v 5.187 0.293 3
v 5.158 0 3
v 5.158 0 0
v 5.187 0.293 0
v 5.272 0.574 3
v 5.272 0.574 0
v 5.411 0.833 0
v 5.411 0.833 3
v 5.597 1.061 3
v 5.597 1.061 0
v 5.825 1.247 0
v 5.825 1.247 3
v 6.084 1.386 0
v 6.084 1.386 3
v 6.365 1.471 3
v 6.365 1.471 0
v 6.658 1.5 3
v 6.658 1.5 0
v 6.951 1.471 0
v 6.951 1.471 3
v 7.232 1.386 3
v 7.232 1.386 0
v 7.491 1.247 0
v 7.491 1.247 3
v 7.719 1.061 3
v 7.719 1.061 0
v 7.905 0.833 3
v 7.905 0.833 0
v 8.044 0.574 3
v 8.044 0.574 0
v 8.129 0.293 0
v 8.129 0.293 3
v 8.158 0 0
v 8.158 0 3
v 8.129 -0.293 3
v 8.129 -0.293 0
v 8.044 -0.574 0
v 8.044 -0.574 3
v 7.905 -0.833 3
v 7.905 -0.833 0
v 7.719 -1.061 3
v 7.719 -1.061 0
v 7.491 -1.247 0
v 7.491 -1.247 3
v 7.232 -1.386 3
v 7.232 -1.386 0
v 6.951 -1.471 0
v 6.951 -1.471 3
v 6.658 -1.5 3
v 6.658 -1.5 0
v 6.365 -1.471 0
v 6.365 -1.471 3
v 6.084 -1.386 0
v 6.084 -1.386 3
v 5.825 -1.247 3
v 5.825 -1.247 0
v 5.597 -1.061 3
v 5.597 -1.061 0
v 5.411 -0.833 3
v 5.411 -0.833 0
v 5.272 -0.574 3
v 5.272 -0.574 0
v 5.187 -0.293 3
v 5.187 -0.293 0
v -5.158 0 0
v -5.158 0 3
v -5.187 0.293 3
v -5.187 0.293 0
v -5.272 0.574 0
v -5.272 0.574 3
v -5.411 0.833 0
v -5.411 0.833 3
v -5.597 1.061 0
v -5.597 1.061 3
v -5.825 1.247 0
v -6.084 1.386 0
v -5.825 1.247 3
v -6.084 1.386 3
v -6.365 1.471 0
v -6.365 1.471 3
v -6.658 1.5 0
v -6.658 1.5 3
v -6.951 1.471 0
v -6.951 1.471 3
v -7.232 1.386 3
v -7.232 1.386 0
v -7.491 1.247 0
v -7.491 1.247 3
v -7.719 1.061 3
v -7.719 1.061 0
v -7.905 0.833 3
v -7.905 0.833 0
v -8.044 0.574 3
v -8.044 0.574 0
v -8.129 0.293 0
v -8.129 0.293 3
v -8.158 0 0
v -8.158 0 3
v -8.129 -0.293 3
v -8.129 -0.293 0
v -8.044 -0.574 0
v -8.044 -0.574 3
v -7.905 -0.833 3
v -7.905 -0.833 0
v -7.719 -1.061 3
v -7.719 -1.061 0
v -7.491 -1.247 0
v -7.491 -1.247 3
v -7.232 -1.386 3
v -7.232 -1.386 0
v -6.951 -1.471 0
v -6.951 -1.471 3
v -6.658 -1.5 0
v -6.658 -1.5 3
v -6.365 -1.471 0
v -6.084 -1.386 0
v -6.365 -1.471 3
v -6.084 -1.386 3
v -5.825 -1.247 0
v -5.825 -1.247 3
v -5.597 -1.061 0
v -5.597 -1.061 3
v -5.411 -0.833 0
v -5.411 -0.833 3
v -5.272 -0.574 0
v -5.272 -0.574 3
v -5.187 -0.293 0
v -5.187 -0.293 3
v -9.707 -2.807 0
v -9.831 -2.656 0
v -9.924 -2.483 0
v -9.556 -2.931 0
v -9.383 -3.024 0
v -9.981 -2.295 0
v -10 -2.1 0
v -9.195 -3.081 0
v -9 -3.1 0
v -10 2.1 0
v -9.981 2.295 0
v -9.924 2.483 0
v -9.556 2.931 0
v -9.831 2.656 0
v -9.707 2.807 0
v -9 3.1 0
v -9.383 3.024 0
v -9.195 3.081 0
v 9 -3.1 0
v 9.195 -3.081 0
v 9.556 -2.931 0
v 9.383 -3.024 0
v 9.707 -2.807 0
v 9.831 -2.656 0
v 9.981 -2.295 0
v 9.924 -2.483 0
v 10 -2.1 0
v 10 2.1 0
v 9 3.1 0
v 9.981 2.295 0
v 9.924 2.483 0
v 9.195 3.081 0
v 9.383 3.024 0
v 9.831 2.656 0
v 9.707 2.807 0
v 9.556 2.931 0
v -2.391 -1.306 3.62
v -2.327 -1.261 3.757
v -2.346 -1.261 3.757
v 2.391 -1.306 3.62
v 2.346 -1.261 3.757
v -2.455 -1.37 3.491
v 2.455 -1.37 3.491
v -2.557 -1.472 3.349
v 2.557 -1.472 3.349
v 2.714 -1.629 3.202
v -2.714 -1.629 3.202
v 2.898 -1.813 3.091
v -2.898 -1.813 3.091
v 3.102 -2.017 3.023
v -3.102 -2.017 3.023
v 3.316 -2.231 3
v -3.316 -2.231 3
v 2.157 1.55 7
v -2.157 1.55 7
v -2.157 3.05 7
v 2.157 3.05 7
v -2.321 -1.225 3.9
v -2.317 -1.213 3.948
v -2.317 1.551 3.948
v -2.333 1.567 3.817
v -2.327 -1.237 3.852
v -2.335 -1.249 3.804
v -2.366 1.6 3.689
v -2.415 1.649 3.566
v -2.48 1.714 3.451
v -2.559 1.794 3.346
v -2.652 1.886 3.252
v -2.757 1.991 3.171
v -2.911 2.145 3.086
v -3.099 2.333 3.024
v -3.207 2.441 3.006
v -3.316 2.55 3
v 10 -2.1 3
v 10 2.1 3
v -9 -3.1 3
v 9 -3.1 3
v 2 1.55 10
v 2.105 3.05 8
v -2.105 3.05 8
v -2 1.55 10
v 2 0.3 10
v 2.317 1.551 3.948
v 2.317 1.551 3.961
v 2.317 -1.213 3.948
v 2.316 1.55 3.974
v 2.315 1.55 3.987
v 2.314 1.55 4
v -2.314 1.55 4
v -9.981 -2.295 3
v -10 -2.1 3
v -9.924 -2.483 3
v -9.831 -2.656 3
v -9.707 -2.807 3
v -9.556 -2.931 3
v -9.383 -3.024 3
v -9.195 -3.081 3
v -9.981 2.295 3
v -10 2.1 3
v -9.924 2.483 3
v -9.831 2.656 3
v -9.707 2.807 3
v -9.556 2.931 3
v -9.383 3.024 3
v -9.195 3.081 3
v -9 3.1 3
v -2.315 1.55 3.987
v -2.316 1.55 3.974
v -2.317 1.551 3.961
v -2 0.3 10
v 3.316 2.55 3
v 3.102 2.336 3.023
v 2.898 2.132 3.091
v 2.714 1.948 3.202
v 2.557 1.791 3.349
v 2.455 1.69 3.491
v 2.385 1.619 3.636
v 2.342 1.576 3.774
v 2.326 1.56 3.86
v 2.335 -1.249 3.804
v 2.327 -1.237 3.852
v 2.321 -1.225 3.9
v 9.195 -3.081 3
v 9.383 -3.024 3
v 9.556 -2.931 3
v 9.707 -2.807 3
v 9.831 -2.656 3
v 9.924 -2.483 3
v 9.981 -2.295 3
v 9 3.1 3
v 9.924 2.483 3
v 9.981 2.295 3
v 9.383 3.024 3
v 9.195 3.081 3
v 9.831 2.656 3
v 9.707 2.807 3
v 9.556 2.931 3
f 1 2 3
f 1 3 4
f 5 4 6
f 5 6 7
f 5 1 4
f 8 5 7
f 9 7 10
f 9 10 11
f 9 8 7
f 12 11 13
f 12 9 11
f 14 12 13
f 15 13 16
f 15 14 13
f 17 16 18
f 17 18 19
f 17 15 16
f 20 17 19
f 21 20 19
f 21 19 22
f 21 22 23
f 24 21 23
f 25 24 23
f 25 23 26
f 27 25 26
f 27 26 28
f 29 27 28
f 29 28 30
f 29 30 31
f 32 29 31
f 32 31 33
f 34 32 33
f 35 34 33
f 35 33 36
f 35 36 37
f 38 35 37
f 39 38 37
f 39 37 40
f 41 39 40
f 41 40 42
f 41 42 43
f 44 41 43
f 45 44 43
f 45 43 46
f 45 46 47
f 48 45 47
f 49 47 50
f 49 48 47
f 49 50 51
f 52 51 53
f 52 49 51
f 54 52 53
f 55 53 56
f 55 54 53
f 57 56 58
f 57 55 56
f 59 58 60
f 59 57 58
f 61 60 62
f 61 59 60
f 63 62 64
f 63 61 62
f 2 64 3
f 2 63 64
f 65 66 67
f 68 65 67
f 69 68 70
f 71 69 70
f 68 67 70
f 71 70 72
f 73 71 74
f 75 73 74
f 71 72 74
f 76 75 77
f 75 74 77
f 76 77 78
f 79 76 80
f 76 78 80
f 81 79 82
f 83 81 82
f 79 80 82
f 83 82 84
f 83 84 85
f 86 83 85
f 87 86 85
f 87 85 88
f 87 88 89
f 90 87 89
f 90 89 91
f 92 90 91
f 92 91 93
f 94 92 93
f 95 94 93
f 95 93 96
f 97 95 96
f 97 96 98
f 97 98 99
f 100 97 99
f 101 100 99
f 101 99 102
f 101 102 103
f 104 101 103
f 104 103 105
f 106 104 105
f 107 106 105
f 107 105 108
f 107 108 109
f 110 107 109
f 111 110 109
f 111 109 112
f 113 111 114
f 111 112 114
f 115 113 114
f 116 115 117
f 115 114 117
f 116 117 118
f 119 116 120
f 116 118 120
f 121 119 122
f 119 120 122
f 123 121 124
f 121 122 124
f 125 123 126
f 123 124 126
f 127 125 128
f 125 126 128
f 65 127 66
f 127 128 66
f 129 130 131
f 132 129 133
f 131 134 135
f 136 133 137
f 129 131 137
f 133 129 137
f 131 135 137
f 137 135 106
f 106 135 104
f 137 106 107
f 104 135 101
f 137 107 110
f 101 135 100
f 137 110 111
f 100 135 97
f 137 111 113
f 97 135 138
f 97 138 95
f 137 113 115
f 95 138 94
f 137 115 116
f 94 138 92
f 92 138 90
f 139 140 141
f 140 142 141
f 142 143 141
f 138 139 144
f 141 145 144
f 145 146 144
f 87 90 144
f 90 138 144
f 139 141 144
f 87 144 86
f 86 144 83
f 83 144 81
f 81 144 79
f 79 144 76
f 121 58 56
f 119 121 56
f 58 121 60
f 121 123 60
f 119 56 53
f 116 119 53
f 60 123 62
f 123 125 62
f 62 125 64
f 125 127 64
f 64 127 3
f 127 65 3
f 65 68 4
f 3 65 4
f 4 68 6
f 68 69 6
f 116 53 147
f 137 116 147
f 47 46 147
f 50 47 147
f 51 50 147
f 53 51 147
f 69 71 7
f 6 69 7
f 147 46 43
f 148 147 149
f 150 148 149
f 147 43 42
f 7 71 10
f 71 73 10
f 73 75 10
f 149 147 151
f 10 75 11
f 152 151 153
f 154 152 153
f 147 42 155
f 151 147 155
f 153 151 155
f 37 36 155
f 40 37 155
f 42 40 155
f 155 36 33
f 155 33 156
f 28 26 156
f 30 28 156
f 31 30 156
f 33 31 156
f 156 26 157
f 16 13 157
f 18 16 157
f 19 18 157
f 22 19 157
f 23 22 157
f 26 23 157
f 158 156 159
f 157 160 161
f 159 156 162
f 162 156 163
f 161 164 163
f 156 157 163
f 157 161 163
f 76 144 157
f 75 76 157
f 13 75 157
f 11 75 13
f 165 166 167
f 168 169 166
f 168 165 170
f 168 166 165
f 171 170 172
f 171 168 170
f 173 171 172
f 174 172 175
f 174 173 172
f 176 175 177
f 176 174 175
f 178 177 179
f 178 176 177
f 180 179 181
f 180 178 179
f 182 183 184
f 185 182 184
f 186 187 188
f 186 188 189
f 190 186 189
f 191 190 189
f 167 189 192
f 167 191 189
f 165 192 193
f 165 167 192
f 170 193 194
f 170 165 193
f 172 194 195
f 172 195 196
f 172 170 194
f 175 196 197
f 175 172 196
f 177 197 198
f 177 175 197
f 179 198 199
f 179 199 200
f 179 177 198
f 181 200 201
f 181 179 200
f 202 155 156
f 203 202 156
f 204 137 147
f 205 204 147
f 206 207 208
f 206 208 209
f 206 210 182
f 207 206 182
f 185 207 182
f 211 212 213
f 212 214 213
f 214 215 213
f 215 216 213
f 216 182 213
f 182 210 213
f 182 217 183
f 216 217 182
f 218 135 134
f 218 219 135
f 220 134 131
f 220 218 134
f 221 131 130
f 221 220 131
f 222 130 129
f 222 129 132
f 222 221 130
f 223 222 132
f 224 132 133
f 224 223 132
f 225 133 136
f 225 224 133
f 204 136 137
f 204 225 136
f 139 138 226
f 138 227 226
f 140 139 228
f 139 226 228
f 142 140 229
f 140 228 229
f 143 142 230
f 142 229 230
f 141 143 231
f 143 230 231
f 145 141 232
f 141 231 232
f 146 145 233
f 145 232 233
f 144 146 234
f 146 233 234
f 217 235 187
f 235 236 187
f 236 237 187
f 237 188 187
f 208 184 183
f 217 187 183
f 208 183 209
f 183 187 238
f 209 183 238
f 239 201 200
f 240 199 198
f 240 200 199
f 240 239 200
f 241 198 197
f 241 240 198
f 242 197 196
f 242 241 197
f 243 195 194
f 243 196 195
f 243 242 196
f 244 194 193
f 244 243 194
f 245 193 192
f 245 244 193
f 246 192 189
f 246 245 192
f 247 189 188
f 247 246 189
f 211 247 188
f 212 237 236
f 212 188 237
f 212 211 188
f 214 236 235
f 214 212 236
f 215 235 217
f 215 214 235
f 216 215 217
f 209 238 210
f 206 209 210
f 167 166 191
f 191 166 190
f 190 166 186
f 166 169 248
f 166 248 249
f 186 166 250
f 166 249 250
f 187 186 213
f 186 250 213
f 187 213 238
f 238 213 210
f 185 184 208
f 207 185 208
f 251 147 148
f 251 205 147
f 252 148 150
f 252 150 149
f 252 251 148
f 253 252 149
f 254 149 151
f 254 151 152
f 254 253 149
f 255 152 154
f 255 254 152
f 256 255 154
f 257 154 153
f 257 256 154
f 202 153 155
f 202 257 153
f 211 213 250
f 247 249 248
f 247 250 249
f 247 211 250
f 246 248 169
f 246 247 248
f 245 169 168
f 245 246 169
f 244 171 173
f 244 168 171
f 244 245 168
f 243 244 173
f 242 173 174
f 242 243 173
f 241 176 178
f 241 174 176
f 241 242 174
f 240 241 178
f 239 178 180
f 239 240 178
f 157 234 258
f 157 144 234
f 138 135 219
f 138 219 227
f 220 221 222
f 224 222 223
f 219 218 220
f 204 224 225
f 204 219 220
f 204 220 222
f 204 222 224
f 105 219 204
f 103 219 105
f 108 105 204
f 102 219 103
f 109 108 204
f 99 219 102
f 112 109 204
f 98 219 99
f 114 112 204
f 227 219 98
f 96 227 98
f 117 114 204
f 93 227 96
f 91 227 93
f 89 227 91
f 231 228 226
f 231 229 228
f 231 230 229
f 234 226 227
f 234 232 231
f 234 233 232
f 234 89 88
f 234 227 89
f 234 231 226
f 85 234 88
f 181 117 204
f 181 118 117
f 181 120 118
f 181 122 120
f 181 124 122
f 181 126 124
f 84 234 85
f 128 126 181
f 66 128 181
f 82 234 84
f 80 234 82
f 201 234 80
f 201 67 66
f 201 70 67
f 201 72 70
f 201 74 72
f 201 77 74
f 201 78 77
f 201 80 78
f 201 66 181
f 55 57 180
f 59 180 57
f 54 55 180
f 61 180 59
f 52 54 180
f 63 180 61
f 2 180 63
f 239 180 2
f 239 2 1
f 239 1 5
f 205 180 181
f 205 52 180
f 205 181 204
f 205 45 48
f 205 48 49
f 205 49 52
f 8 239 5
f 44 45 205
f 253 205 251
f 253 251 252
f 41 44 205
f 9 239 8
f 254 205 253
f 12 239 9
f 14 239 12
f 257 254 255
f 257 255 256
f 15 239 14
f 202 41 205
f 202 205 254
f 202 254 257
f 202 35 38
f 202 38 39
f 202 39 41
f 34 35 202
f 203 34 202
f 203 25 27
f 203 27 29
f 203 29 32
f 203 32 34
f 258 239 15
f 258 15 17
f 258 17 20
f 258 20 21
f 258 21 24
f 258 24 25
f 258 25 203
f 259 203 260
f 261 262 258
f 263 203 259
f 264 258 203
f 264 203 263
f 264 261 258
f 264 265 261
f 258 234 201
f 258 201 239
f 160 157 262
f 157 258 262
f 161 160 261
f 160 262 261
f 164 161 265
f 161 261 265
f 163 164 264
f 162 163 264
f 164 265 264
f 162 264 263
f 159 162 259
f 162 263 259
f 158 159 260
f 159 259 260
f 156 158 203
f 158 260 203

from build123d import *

# Parameters (mm, degrees)
SKETCH1_W           = 20
SKETCH1_H           = 6.2
BOSS_EXTRUDE1_DEPTH = 3
SNAP_START          = 0.3
SNAP_HOOK1_DEPTH    = 1.25
SNAP_START_2        = -2.157223338
SNAP_HOOK1_2_DEPTH  = 4.314446676
SNAP_START_3        = -2.366854455
SNAP_HOOK1_3_DEPTH  = 4.73370891
SNAP_START_4        = -2
SNAP_HOOK1_4_DEPTH  = 6
FILLET1_R           = 1
CUT_EXTRUDE1_REACH  = 14.594
SKETCH3_R           = 1.5
FILLET2_R           = 1


with BuildPart() as part:
    # Sketch1 → Boss-Extrude1 (new body)
    with BuildSketch(Plane.XY):
        Rectangle(SKETCH1_W, SKETCH1_H)
    extrude(amount=BOSS_EXTRUDE1_DEPTH)

    # Snap Hook1: read off the stored shape, not the designer's step
    # Snap Hook1 outline → Snap Hook1 (add)
    with BuildSketch(Plane(origin=(0, 0, 0), x_dir=(1, 0, 0), z_dir=(0, 1, 0)).offset(SNAP_START)):
        Polygon((2.366854455, -3), (-2.366854455, -3), (-2, -10), (2, -10), align=None)
    extrude(amount=SNAP_HOOK1_DEPTH)

    # Snap Hook1 2 outline → Snap Hook1 2 (add)
    with BuildSketch(Plane.YZ.offset(SNAP_START_2)):
        Polygon((0.3, 3), (0.3, 10), (-1.45, 3), align=None)
        Polygon((1.55, 10), (1.55, 7), (3.05, 7), (3.05, 8), align=None)
    extrude(amount=SNAP_HOOK1_2_DEPTH)

    # Snap Hook1 3 outline → Snap Hook1 3 (add)
    with BuildSketch(Plane.YZ.offset(SNAP_START_3)):
        Polygon((0.3, 3), (0.3, 10), (-1.45, 3), align=None)
    extrude(amount=SNAP_HOOK1_3_DEPTH)

    # Snap Hook1 4 outline → Snap Hook1 4 (cut)
    with BuildSketch(Plane(origin=(0, 0, 0), x_dir=(1, 0, 0), z_dir=(0, 1, 0)).offset(SNAP_START_4)):
        Polygon((-2.366854455, -3), (-2.366854455, -11), (-1.947592221, -11), (-2, -10), align=None)
        Polygon((2, -10), (1.947592221, -11), (2.366854455, -11), (2.366854455, -3), align=None)
    extrude(amount=SNAP_HOOK1_4_DEPTH, mode=Mode.SUBTRACT)

    # Fillet1
    # the kernel refuses this fillet: 1 mm, written as the material it adds along each edge
    with BuildSketch(Plane(origin=(4.866854455, 1.55, 3), x_dir=(0, 1, 0), z_dir=(-1, 0, 0))) as fillet1_piece_1_section:
        with BuildLine():
            CenterArc((FILLET1_R, -FILLET1_R), FILLET1_R, 90, 90)
            Line((0, -FILLET1_R), (0, 0))
            Line((0, 0), (FILLET1_R, 0))
        make_face()
    fillet1_piece_1 = extrude(amount=9.73370891, mode=Mode.PRIVATE)
    fillet1_piece_1 = split(fillet1_piece_1, bisect_by=Plane(origin=(-2.347040948, 1.55, 3.378064238), z_dir=(0.9986295347544344, 0, -0.05233595624560593)), keep=Keep.TOP, mode=Mode.PRIVATE)
    fillet1_piece_1 = split(fillet1_piece_1, bisect_by=Plane(origin=(2.373702086, 1.55, 2.869339421), z_dir=(-0.9986295347544344, 0, -0.05233595624560593)), keep=Keep.TOP, mode=Mode.PRIVATE)
    add(fillet1_piece_1)
    with BuildSketch(Plane(origin=(2.366854455, 1.55, 3), x_dir=(1, 0, 0), z_dir=(0, -1, 0))) as fillet1_piece_2_section:
        with BuildLine():
            CenterArc((FILLET1_R * 0.948964566712, FILLET1_R), FILLET1_R, 183, 87)
            Line((-FILLET1_R * 0.0496649680421, FILLET1_R * 0.947664043754), (0, 0))
            Line((0, 0), (FILLET1_R * 0.948964566712, 0))
        make_face()
    fillet1_piece_2 = extrude(amount=5.372411417, mode=Mode.PRIVATE)
    fillet1_piece_2 = split(fillet1_piece_2, bisect_by=Plane(origin=(2.366854455, -1.273529412, 3.705882353), z_dir=(0, 0.9701425001453319, -0.24253562503633297)), keep=Keep.TOP, mode=Mode.PRIVATE)
    add(fillet1_piece_2)
    with BuildSketch(Plane(origin=(4.318795471, -1.45, 3), x_dir=(0, -1, 0), z_dir=(-1, 0, 0))) as fillet1_piece_3_section:
        with BuildLine():
            CenterArc((FILLET1_R * 0.780776406404, FILLET1_R), FILLET1_R, 194.036243468, 75.963756532)
            Line((-FILLET1_R * 0.189366093741, FILLET1_R * 0.757464374964), (0, 0))
            Line((0, 0), (FILLET1_R * 0.780776406404, 0))
        make_face()
    fillet1_piece_3 = extrude(amount=8.637590942, mode=Mode.PRIVATE)
    fillet1_piece_3 = split(fillet1_piece_3, bisect_by=Plane(origin=(2.372200924, -1.45, 2.897983303), z_dir=(-0.9986295347544344, 0, -0.05233595624560593)), keep=Keep.TOP, mode=Mode.PRIVATE)
    fillet1_piece_3 = split(fillet1_piece_3, bisect_by=Plane(origin=(-2.34854211, -1.45, 3.349420356), z_dir=(0.9986295347544344, 0, -0.05233595624560593)), keep=Keep.TOP, mode=Mode.PRIVATE)
    add(fillet1_piece_3)
    with BuildSketch(Plane(origin=(-2.366854455, -3.822411417, 3), x_dir=(-1, 0, 0), z_dir=(0, 1, 0))) as fillet1_piece_4_section:
        with BuildLine():
            CenterArc((FILLET1_R * 0.948964566712, FILLET1_R), FILLET1_R, 183, 87)
            Line((-FILLET1_R * 0.0496649680421, FILLET1_R * 0.947664043754), (0, 0))
            Line((0, 0), (FILLET1_R * 0.948964566712, 0))
        make_face()
    fillet1_piece_4 = extrude(amount=5.372411417, mode=Mode.PRIVATE)
    fillet1_piece_4 = split(fillet1_piece_4, bisect_by=Plane(origin=(-2.366854455, -1.589553613, 2.441785549), z_dir=(0, 0.9701425001453319, -0.24253562503633297)), keep=Keep.TOP, mode=Mode.PRIVATE)
    add(fillet1_piece_4)
    with BuildSketch(Plane(origin=(2.366854455, 3.922411417, 3), x_dir=(1, 0, 0), z_dir=(0, -1, 0))) as fillet1_piece_5a_section:
        with BuildLine():
            CenterArc((FILLET1_R * 0.948964566712, FILLET1_R), FILLET1_R, 183, 87)
            Line((-FILLET1_R * 0.0496649680421, FILLET1_R * 0.947664043754), (0, 0))
            Line((0, 0), (FILLET1_R * 0.948964566712, 0))
        make_face()
    fillet1_piece_5a = extrude(amount=7.744822834, mode=Mode.PRIVATE)
    fillet1_piece_5a = split(fillet1_piece_5a, bisect_by=Plane(origin=(2.366854455, 3.1, 3), z_dir=(0, -1, 0)), keep=Keep.TOP, mode=Mode.PRIVATE)
    fillet1_piece_5a = split(fillet1_piece_5a, bisect_by=Plane(origin=(2.366854455, 1.55, 3), z_dir=(0, 1, 0)), keep=Keep.TOP, mode=Mode.PRIVATE)
    with BuildSketch(Plane(origin=(4.866854455, 1.55, 3), x_dir=(0, 1, 0), z_dir=(-1, 0, 0))) as fillet1_piece_5b_section:
        with BuildLine():
            CenterArc((FILLET1_R, -FILLET1_R), FILLET1_R, 90, 90)
            Line((0, -FILLET1_R), (0, 0))
            Line((0, 0), (FILLET1_R, 0))
        make_face()
    fillet1_piece_5b = extrude(amount=9.73370891, mode=Mode.PRIVATE)
    fillet1_piece_5b = split(fillet1_piece_5b, bisect_by=Plane(origin=(2.373702086, 1.55, 2.869339421), z_dir=(0.9986295347544344, 0, 0.05233595624560593)), keep=Keep.TOP, mode=Mode.PRIVATE)
    fillet1_piece_5 = fillet1_piece_5a & fillet1_piece_5b
    add(fillet1_piece_5)
    with BuildSketch(Plane(origin=(4.866854455, 1.55, 3), x_dir=(0, 1, 0), z_dir=(-1, 0, 0))) as fillet1_piece_6a_section:
        with BuildLine():
            CenterArc((FILLET1_R, -FILLET1_R), FILLET1_R, 90, 90)
            Line((0, -FILLET1_R), (0, 0))
            Line((0, 0), (FILLET1_R, 0))
        make_face()
    fillet1_piece_6a = extrude(amount=9.73370891, mode=Mode.PRIVATE)
    fillet1_piece_6a = split(fillet1_piece_6a, bisect_by=Plane(origin=(-2.347040948, 1.55, 3.378064238), z_dir=(-0.9986295347544344, 0, 0.05233595624560593)), keep=Keep.TOP, mode=Mode.PRIVATE)
    with BuildSketch(Plane(origin=(-2.366854455, -3.822411417, 3), x_dir=(-1, 0, 0), z_dir=(0, 1, 0))) as fillet1_piece_6b_section:
        with BuildLine():
            CenterArc((FILLET1_R * 0.948964566712, FILLET1_R), FILLET1_R, 183, 87)
            Line((-FILLET1_R * 0.0496649680421, FILLET1_R * 0.947664043754), (0, 0))
            Line((0, 0), (FILLET1_R * 0.948964566712, 0))
        make_face()
    fillet1_piece_6b = extrude(amount=7.744822834, mode=Mode.PRIVATE)
    fillet1_piece_6b = split(fillet1_piece_6b, bisect_by=Plane(origin=(-2.366854455, 3.1, 3), z_dir=(0, -1, 0)), keep=Keep.TOP, mode=Mode.PRIVATE)
    fillet1_piece_6b = split(fillet1_piece_6b, bisect_by=Plane(origin=(-2.366854455, 1.55, 3), z_dir=(0, 1, 0)), keep=Keep.TOP, mode=Mode.PRIVATE)
    fillet1_piece_6 = fillet1_piece_6a & fillet1_piece_6b
    add(fillet1_piece_6)
    with BuildSketch(Plane(origin=(2.366854455, 1.55, 3), x_dir=(1, 0, 0), z_dir=(0, -1, 0))) as fillet1_piece_7a_section:
        with BuildLine():
            CenterArc((FILLET1_R * 0.948964566712, FILLET1_R), FILLET1_R, 183, 87)
            Line((-FILLET1_R * 0.0496649680421, FILLET1_R * 0.947664043754), (0, 0))
            Line((0, 0), (FILLET1_R * 0.948964566712, 0))
        make_face()
    fillet1_piece_7a = extrude(amount=5.372411417, mode=Mode.PRIVATE)
    fillet1_piece_7a = split(fillet1_piece_7a, bisect_by=Plane(origin=(2.366854455, -3.1, 3), z_dir=(0, 1, 0)), keep=Keep.TOP, mode=Mode.PRIVATE)
    fillet1_piece_7a = split(fillet1_piece_7a, bisect_by=Plane(origin=(2.366854455, -1.273529412, 3.705882353), z_dir=(0, -0.9701425001453319, 0.24253562503633297)), keep=Keep.TOP, mode=Mode.PRIVATE)
    with BuildSketch(Plane(origin=(4.318795471, -1.45, 3), x_dir=(0, -1, 0), z_dir=(-1, 0, 0))) as fillet1_piece_7b_section:
        with BuildLine():
            CenterArc((FILLET1_R * 0.780776406404, FILLET1_R), FILLET1_R, 194.036243468, 75.963756532)
            Line((-FILLET1_R * 0.189366093741, FILLET1_R * 0.757464374964), (0, 0))
            Line((0, 0), (FILLET1_R * 0.780776406404, 0))
        make_face()
    fillet1_piece_7b = extrude(amount=8.637590942, mode=Mode.PRIVATE)
    fillet1_piece_7b = split(fillet1_piece_7b, bisect_by=Plane(origin=(2.372200924, -1.45, 2.897983303), z_dir=(0.9986295347544344, 0, 0.05233595624560593)), keep=Keep.TOP, mode=Mode.PRIVATE)
    fillet1_piece_7 = fillet1_piece_7a & fillet1_piece_7b
    add(fillet1_piece_7)
    with BuildSketch(Plane(origin=(-2.366854455, -3.822411417, 3), x_dir=(-1, 0, 0), z_dir=(0, 1, 0))) as fillet1_piece_8a_section:
        with BuildLine():
            CenterArc((FILLET1_R * 0.948964566712, FILLET1_R), FILLET1_R, 183, 87)
            Line((-FILLET1_R * 0.0496649680421, FILLET1_R * 0.947664043754), (0, 0))
            Line((0, 0), (FILLET1_R * 0.948964566712, 0))
        make_face()
    fillet1_piece_8a = extrude(amount=5.372411417, mode=Mode.PRIVATE)
    fillet1_piece_8a = split(fillet1_piece_8a, bisect_by=Plane(origin=(-2.366854455, -3.1, 3), z_dir=(0, 1, 0)), keep=Keep.TOP, mode=Mode.PRIVATE)
    fillet1_piece_8a = split(fillet1_piece_8a, bisect_by=Plane(origin=(-2.366854455, -1.589553613, 2.441785549), z_dir=(0, -0.9701425001453319, 0.24253562503633297)), keep=Keep.TOP, mode=Mode.PRIVATE)
    with BuildSketch(Plane(origin=(4.318795471, -1.45, 3), x_dir=(0, -1, 0), z_dir=(-1, 0, 0))) as fillet1_piece_8b_section:
        with BuildLine():
            CenterArc((FILLET1_R * 0.780776406404, FILLET1_R), FILLET1_R, 194.036243468, 75.963756532)
            Line((-FILLET1_R * 0.189366093741, FILLET1_R * 0.757464374964), (0, 0))
            Line((0, 0), (FILLET1_R * 0.780776406404, 0))
        make_face()
    fillet1_piece_8b = extrude(amount=8.637590942, mode=Mode.PRIVATE)
    fillet1_piece_8b = split(fillet1_piece_8b, bisect_by=Plane(origin=(-2.34854211, -1.45, 3.349420356), z_dir=(-0.9986295347544344, 0, 0.05233595624560593)), keep=Keep.TOP, mode=Mode.PRIVATE)
    fillet1_piece_8 = fillet1_piece_8a & fillet1_piece_8b
    add(fillet1_piece_8)

    # Sketch3 → Cut-Extrude1 (cut, up to next)
    with BuildSketch(Plane.XY.offset(3), mode=Mode.PRIVATE) as cut_extrude1_sk1:
        with Locations((-6.657909511, 0)):
            Circle(SKETCH3_R)
    cut_extrude1_tool1 = extrude(cut_extrude1_sk1.sketch, amount=-CUT_EXTRUDE1_REACH, mode=Mode.PRIVATE) & part.part
    cut_extrude1 = cut_extrude1_tool1.solids().sort_by_distance((-6.65791, 0, 3))[0]
    add(cut_extrude1, mode=Mode.SUBTRACT)

    # Mirror1: Cut-Extrude1 across plane
    add(cut_extrude1.mirror(Plane(origin=(0, 0, 0), x_dir=(0, 0, 1), z_dir=(1, 0, 0))), mode=Mode.SUBTRACT)

    # Fillet2
    fillet2_edges = [part.edges().sort_by_distance(p)[0] for p in [
        (10, -3.1, 1.5),
        (-10, -3.1, 1.5),
        (-10, 3.1, 1.5),
        (10, 3.1, 1.5),
    ]]
    fillet(fillet2_edges, radius=FILLET2_R)


solid = part.part
